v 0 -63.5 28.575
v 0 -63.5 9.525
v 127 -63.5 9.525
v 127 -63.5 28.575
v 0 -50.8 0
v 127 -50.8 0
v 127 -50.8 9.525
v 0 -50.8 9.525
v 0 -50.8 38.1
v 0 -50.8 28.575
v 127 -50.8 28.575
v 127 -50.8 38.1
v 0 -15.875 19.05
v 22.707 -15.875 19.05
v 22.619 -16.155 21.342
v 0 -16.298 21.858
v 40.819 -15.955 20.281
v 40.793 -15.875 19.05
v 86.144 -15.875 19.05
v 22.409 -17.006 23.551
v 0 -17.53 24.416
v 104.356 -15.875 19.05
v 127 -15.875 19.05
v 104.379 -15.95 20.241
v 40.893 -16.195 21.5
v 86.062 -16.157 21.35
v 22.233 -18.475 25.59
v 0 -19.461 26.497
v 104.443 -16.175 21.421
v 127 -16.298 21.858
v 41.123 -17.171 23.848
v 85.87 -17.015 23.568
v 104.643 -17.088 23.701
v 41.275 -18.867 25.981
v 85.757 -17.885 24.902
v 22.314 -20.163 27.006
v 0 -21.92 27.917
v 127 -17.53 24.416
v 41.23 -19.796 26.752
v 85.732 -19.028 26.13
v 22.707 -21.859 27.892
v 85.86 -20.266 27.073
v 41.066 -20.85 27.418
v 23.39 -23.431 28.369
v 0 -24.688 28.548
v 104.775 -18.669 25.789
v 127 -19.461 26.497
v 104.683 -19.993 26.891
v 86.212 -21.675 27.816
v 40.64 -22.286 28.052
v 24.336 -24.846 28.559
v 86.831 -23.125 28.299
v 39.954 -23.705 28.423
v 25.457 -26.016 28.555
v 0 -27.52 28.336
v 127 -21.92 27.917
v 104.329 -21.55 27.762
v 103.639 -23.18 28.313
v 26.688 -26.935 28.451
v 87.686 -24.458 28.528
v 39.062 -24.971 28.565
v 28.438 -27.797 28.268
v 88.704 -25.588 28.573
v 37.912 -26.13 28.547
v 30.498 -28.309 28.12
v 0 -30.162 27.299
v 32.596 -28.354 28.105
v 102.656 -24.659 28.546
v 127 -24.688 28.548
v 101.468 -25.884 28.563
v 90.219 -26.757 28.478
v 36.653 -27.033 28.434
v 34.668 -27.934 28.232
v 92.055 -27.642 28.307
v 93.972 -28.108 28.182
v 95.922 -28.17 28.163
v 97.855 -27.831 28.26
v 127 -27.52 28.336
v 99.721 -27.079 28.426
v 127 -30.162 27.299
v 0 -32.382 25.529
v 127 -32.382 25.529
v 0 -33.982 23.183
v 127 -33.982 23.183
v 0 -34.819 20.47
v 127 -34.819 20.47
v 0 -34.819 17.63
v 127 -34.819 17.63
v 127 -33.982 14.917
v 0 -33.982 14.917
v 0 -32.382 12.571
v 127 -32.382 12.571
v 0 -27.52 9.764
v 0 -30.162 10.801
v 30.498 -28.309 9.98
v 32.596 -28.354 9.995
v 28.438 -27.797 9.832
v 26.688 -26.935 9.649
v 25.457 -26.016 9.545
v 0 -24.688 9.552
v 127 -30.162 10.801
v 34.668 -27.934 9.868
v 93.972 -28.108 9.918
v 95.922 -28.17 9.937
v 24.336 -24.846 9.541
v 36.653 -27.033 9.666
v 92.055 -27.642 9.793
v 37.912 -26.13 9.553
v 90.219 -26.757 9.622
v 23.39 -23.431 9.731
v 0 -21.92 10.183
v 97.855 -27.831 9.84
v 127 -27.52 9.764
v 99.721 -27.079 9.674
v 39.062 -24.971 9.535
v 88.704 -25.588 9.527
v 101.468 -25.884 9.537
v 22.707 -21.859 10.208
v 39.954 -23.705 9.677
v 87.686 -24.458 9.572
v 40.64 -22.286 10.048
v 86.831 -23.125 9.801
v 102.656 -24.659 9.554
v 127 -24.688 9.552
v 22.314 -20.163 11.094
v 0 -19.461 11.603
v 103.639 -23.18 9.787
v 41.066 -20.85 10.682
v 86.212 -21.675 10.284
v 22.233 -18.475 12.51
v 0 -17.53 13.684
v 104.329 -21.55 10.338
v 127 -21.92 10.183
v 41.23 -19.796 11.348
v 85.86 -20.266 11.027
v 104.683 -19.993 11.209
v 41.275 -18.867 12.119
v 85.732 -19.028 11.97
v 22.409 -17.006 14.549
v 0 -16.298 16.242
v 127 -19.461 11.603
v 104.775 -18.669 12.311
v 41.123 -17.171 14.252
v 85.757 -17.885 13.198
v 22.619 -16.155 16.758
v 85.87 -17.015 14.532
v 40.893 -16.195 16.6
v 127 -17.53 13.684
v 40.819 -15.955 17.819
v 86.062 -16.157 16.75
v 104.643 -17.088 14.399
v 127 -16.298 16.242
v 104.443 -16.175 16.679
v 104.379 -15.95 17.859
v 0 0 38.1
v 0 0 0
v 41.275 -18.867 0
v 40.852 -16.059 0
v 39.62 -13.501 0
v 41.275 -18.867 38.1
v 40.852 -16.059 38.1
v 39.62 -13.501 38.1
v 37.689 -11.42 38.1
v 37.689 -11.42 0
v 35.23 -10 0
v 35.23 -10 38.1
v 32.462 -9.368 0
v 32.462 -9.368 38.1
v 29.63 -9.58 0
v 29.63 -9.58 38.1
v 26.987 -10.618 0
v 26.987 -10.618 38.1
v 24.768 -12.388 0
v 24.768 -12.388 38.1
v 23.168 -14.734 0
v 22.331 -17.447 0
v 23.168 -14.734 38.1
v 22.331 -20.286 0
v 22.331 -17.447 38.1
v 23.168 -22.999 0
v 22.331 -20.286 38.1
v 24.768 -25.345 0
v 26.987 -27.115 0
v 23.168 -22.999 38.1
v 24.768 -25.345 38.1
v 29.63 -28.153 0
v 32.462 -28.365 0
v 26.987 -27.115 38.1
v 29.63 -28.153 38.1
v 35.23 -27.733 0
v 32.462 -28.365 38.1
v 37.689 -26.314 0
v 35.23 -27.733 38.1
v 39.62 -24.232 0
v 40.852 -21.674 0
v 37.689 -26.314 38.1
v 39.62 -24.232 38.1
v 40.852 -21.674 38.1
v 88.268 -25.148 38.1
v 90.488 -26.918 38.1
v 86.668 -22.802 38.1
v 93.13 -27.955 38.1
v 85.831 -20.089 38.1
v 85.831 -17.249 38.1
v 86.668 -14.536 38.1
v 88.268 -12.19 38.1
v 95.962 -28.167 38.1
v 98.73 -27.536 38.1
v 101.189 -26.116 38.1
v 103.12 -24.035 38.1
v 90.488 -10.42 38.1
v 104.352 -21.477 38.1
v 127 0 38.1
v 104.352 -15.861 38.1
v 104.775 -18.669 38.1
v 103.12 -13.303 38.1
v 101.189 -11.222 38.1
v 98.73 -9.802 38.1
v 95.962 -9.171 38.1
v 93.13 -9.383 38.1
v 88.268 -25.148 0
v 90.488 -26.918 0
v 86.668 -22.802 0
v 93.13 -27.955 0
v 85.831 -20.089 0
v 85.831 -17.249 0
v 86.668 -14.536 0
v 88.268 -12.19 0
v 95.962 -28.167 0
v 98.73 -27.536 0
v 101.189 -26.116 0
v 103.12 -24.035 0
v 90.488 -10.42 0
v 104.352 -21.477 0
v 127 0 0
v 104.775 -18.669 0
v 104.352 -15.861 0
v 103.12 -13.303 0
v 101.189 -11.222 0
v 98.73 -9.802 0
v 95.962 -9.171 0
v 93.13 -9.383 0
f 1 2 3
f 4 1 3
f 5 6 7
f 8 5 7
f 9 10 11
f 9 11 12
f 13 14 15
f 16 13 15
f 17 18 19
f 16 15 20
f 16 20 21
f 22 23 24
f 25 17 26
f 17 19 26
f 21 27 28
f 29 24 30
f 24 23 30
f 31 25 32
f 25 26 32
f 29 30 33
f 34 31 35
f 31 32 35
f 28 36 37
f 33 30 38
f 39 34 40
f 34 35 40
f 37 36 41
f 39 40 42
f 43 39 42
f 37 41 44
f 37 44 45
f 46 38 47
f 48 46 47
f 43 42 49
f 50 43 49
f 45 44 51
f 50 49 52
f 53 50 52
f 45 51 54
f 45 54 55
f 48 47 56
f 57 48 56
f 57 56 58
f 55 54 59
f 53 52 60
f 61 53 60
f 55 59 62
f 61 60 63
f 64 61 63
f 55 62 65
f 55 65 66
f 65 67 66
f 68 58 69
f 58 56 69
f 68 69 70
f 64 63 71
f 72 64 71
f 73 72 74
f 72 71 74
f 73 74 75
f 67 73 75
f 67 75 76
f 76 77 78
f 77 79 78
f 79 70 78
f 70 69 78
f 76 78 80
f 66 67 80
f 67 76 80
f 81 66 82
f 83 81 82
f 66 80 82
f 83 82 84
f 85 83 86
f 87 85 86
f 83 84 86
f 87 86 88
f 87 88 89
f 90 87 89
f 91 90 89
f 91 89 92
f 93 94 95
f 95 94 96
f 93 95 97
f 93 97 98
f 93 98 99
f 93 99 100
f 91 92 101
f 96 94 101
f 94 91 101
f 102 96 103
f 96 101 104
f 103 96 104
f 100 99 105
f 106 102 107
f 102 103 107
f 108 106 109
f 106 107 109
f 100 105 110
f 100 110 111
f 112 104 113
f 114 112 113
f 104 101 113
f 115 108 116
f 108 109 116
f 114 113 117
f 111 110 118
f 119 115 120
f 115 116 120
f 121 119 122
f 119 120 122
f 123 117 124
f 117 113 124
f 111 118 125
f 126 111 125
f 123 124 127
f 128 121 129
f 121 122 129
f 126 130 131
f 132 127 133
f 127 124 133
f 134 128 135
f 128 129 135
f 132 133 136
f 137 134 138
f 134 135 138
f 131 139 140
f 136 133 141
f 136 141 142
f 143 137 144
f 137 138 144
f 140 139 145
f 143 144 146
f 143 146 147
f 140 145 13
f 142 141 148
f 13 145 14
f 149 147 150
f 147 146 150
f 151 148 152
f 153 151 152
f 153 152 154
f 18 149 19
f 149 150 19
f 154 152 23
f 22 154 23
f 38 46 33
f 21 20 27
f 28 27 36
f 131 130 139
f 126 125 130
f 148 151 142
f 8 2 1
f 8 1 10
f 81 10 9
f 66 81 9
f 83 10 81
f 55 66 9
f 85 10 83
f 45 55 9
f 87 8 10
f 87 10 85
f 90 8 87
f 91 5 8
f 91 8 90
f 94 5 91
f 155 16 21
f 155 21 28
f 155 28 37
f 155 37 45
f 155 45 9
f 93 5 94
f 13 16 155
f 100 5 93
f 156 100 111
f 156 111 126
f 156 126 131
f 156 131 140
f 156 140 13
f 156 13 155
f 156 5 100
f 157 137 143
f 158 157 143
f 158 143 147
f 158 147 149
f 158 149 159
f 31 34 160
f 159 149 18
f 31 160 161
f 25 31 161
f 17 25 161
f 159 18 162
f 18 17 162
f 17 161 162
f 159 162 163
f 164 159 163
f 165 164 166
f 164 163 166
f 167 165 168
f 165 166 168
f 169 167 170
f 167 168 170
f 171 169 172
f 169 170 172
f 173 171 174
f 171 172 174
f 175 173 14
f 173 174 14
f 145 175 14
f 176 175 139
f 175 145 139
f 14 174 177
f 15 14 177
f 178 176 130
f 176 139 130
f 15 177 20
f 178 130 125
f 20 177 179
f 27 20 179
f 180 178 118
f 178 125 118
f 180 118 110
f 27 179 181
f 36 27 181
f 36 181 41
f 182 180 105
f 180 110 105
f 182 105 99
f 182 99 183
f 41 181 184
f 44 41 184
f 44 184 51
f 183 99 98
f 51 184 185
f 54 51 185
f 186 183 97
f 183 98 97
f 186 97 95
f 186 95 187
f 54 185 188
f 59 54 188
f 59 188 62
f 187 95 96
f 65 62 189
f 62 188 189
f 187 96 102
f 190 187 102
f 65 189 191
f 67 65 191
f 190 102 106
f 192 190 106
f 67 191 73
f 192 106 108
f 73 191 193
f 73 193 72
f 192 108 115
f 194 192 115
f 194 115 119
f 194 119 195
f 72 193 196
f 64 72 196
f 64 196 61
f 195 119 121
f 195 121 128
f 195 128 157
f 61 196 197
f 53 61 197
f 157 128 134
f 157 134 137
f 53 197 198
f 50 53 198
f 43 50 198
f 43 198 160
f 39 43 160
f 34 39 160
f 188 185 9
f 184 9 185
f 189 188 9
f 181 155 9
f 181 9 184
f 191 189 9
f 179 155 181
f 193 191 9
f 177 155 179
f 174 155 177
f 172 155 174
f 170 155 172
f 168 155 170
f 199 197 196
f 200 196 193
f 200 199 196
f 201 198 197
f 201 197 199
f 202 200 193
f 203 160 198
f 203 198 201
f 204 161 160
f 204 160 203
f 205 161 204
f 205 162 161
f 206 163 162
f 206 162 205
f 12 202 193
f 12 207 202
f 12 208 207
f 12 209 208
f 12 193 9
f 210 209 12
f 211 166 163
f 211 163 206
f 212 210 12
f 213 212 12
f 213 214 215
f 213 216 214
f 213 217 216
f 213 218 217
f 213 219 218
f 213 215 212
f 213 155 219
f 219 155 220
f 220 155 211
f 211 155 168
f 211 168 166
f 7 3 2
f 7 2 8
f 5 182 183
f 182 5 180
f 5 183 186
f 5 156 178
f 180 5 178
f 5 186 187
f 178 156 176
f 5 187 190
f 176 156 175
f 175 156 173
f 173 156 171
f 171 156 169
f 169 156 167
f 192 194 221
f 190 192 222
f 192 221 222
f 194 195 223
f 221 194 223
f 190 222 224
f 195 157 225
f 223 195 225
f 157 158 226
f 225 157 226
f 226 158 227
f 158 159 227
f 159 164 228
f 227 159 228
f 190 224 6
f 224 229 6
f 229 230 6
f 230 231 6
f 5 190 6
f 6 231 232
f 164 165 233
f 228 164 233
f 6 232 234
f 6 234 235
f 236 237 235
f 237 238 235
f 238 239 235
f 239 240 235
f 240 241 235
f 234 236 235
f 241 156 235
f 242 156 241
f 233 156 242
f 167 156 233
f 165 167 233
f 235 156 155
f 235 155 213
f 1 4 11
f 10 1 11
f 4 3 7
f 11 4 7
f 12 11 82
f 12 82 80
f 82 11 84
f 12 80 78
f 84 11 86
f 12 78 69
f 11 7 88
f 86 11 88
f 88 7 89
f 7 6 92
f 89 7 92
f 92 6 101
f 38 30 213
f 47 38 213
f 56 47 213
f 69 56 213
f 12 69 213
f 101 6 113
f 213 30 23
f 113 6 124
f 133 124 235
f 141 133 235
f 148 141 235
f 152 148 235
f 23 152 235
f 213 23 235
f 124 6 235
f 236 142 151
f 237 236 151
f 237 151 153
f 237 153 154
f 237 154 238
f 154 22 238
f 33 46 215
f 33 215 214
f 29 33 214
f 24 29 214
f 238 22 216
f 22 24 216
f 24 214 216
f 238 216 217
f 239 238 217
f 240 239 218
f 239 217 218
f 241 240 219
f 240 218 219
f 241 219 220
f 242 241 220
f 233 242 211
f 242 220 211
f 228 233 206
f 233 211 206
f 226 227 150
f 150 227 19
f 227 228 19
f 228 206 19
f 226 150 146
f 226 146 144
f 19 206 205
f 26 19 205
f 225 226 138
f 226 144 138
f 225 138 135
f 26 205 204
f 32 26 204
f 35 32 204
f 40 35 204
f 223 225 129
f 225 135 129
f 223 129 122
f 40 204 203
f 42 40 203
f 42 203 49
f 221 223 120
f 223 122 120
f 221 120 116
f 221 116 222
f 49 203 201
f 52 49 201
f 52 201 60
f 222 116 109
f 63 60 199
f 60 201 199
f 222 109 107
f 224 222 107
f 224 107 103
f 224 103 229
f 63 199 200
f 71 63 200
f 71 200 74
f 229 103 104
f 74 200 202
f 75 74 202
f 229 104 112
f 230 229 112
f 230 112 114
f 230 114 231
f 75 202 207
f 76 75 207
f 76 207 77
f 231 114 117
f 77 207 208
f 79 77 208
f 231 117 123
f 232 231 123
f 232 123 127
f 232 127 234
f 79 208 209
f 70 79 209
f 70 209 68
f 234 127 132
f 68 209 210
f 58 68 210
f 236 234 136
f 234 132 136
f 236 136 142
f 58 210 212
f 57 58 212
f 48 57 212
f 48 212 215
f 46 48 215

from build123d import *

# Parameters (mm, degrees)
F0_W      = 127
F0_H      = 63.5
F1_DEPTH  = 38.1
F2_W      = 12.7
F2_H      = 9.525
F3_DEPTH  = 127
F4_R      = 9.525
F5_DEPTH  = 25.4
F5_FACE_R = 9.525
F6_DEPTH  = 63.78913
F7_R      = 9.525
F8_DEPTH  = 127.28539


with BuildPart() as f1:
    # F0 (on Top) → F1 (new body)
    with BuildSketch(Plane.XY):
        with Locations((63.5, -31.75)):
            Rectangle(F0_W, F0_H)
    extrude(amount=F1_DEPTH)

    # F2 (on face) → F3 (cut)
    with BuildSketch(Plane.YZ.offset(127)):
        with Locations((-57.15, 33.3375)):
            Rectangle(F2_W, F2_H)
        with Locations((-57.15, 4.7625)):
            Rectangle(F2_W, F2_H)
    extrude(amount=-F3_DEPTH, mode=Mode.SUBTRACT)

    # F4 (on face) → F5 (join)
    with BuildSketch(Plane.XY.offset(38.1)):
        with Locations((31.75, -18.866556)):
            Circle(F4_R)
        with Locations((95.25, -18.669)):
            Circle(F4_R)
    extrude(amount=F5_DEPTH)

    # F5_face (on face) → F6 (cut)
    with BuildSketch(Plane(origin=(31.75, -18.866556, 63.5), x_dir=(1, 0, 0), z_dir=(0, 0, 1))):
        Circle(F5_FACE_R)
        with Locations((63.5, 0.197556)):
            Circle(F5_FACE_R)
    extrude(amount=-F6_DEPTH, mode=Mode.SUBTRACT)

    # F7 (on face) → F8 (cut)
    with BuildSketch(Plane.YZ.offset(127)):
        with Locations((-25.4, 19.05)):
            Circle(F7_R)
    extrude(amount=-F8_DEPTH, mode=Mode.SUBTRACT)


solid = f1.part
